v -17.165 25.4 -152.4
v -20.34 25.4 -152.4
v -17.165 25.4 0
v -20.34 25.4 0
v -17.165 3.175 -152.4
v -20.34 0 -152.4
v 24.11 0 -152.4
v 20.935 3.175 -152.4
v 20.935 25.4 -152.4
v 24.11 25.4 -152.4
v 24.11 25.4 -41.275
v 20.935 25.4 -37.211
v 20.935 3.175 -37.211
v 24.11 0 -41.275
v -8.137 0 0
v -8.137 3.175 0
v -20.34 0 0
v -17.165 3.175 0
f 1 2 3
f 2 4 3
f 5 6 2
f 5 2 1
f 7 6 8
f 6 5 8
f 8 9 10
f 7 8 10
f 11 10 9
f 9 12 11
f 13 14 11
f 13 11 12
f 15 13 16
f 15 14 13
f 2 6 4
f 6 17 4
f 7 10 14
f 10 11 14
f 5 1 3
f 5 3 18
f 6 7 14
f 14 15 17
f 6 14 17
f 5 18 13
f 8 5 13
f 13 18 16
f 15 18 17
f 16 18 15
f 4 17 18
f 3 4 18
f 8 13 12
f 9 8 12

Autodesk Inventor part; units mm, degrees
ref_plane "YZ Plane" through (0, 0, 0) normal (1, 0, 0) x (0, 1, 0)
ref_plane "XZ Plane" through (0, 0, 0) normal (0, 1, 0) x (-1, 0, 0)
ref_plane "XY Plane" through (0, 0, 0) normal (0, 0, 1) x (1, 0, 0)
sketch "Sketch1" plane through (0, 0, 0) normal (0, 0, 1) x (1, 0, 0)
  line L0 (24.1101, 25.4) -> (24.1101, 0)
  line L1 (24.1101, 0) -> (-20.3399, 0)
  line L2 (-20.3399, 0) -> (-20.3399, 25.4)
  line L3 (-17.1649, 25.4) -> (-17.1649, 3.175)
  line L4 (-17.1649, 3.175) -> (20.9351, 3.175)
  line L5 (20.9351, 3.175) -> (20.9351, 25.4)
  line L6 (-20.3399, 25.4) -> (-17.1649, 25.4)
  line L7 (24.1101, 25.4) -> (20.9351, 25.4)
  point P0 (0, 0)
  dimension "d0" = 44.45
  dimension "d1" = 25.4
  dimension "d2" = 3.175
extrude "Extrusion1" add sketch "Sketch1" against normal blind 152.4
sketch "Sketch5" plane through (-20.3399, 0, 0) normal (0, -1, 0) x (1, 0, 0)
  line L0 (0, 0) -> (44.45, 0) projected
  line L1 (44.45, 0) -> (44.45, -152.4) projected
  line L2 (44.45, -152.4) -> (44.45, -41.275)
  line L3 (44.45, 0) -> (44.45, -152.4) projected
  line L4 (44.45, -41.275) -> (12.2024, 0)
  line L5 (12.2024, 0) -> (44.45, 0)
  line L6 (44.45, 0) -> (44.45, -41.275)
  point P0 (20.3399, 0)
  dimension "d14" = 111.125
  dimension "d15" = 38
extrude "Extrusion4" cut sketch "Sketch5" against normal through all
properties part number "Horizontal channel right"
